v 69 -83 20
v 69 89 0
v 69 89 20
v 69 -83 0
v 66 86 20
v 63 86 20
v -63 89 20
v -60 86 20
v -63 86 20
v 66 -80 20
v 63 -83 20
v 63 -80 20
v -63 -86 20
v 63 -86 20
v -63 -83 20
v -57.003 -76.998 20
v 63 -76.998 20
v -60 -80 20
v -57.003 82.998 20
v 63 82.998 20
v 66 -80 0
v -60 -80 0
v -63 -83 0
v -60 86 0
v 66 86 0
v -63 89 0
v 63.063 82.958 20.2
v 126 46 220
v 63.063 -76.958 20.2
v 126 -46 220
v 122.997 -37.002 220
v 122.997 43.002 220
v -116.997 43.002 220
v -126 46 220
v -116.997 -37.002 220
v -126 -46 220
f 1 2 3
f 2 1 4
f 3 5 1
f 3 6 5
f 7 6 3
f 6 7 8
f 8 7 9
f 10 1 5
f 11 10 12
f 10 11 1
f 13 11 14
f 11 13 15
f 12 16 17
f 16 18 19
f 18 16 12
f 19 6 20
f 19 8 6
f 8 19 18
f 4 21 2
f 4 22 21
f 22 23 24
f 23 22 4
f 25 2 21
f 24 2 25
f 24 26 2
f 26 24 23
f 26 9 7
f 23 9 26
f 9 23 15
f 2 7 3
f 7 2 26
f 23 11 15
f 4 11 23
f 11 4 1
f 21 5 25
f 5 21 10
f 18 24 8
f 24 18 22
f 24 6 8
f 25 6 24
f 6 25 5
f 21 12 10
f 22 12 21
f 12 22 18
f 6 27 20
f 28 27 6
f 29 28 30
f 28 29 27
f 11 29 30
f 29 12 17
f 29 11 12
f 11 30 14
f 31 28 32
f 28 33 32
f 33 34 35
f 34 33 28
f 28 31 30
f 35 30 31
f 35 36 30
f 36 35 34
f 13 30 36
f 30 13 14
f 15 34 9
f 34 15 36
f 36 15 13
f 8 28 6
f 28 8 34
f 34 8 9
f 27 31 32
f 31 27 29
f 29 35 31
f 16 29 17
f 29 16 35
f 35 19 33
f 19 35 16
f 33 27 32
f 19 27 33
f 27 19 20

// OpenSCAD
include <pw_primitives.scad>;

eps = 0.01;
sphere_r = 5;
cube_x = 20;
cube_y = 40;
cube_z = 50;

$fn=45;

// experiment in making a chamfered edge at the top of a solid, say a
// cube, that can then be 'cut out' of a surface to provide a guide
// when inserting tools, say.
// The logic is to build a 'negative object' around the orignal shape,
// but curved using a minkowski join with a sphere at the top, then this
// is removed from a cube larger than the original by the radius of the
// sphere.  Without an effective 'offset' tool on 3D objects, its hard
// to do this without knowing the size and shape of the original object.
* difference() {
    cube([cube_x+sphere_r*2, cube_y+sphere_r*2, cube_z-eps]);
    translate([0, 0, 0]) minkowski(convexity=3) {
        difference() {
            cube([cube_x+sphere_r*2, cube_y+sphere_r*2, cube_z-sphere_r]);
            translate([sphere_r, sphere_r, -eps]) 
              cube([cube_x, cube_y, cube_z]);
        }
        sphere(r=sphere_r);
    };
}

length = 250;
thickness = 5;
i_width = 120; o_width = i_width + thickness*2;
i_height = 160; o_height = i_height + thickness*2;
cyl_diam = 500; cyl_rad = cyl_diam / 2;

// A rectangular 160x120 tube going tangentially into the
// side of a 500mm diameter cylinder.
* difference() {
    translate([0, 0, o_height]) rotate([0, 90, 0]) 
      rectangular_tube(i_height, i_width, thickness, length);
    translate([length, cyl_rad + thickness, -eps]) 
      cylinder(h=o_height+eps*2, d=cyl_diam);
}

// Circular feed-in tube of OD 160mm going tangentially into the
// side of a 500mm diameter cylinder.
* translate([160/2, 0, 160/2]) difference() {
    rotate([-90, 0, 0]) pipe_rt(250, 160/2, 5/2);
    translate([500/2+2.5-160/2, 0, -160/2]) cylinder(h=160, d=500);
}

// a section of 150mm pipe with angled vanes inside it to spin the
// airflow.
* union() {
    pipe_rt(100, 155/2, 5/2);
    translate([0, 0, 95]) pipe_rt(20, 160/2, 5/2);
    translate([0, 0, 90]) hollow_cone_rt(5, 155/2, 160/2, 5/2);
    difference() {
        linear_extrude(100, twist=45) union() {
            translate([-75+00, 0]) square([20.1, 2]);
            translate([+75-20, 0]) square([20.1, 2]);
            translate([0, -75+00]) square([2, 20.1]);
            translate([0, +75-20]) square([2, 20.1]);
        }
        translate([0, 0, -eps]) cylinder(h=20, d1=150, d2=110);
        translate([0, 0, 80]) cylinder(h=20+eps, d1=110, d2=150);
    }
}

// 45-degree rectangular feed-in to top of 150mm diameter tube.
// rectangular tube of same cross-sectional area as 150mm tube
// but half the height is 75 x 235 mm; here we use 80 x 240.
* union() {
    // the feed-in tube, minus the cylinder it's intersecting,
    // but only up to the cylinder.
    difference() {
        rotate([0, 0, 45]) translate([0, 0, 155]) 
          rotate([0, 90, 0]) rectangular_tube(80, 240, 2.5, 400);
        translate([-(240/sqrt(2)+10), 0, epsilon]) cube([240/sqrt(2), 240*sqrt(2), 155]);
        translate([0, 0, 155/2]) rotate([-90, 0, 0]) cylinder(h=430, d=150);
    };
    // the outlet tube, minus the rectangle intersecting it.
    difference() {
        translate([0, 0, 155/2]) rotate([-90, 0, 0]) pipe_rt(430, 155/2, 5/2);
        intersection() {
            rotate([0, 0, 45]) translate([0, 2.5, 152.5-80]) 
              cube([360, 240, 80]);
            cube([155, 430, 155]);
        }
    }
    // the end cap
    translate([0, 430-epsilon, 155/2]) rotate([-90, 0, 0]) cylinder(h=5, d=155);
}

// A rectangular duct resize from 160x120 to 240x80 in 200mm, plus 
union() {
    translate([-126/2, -166/2, 0]) rectangular_tube(126, 166, 3, 20);
    translate([0, 0, 20]) difference() {
        rectangular_cone(120/2+3, 160/2+6, 240/2+6, 80/2+6, 200);
        translate([3, 3, -epsilon]) rectangular_cone(120/2, 160/2, 240/2, 80/2, 200+epsilo2);
    }
}
